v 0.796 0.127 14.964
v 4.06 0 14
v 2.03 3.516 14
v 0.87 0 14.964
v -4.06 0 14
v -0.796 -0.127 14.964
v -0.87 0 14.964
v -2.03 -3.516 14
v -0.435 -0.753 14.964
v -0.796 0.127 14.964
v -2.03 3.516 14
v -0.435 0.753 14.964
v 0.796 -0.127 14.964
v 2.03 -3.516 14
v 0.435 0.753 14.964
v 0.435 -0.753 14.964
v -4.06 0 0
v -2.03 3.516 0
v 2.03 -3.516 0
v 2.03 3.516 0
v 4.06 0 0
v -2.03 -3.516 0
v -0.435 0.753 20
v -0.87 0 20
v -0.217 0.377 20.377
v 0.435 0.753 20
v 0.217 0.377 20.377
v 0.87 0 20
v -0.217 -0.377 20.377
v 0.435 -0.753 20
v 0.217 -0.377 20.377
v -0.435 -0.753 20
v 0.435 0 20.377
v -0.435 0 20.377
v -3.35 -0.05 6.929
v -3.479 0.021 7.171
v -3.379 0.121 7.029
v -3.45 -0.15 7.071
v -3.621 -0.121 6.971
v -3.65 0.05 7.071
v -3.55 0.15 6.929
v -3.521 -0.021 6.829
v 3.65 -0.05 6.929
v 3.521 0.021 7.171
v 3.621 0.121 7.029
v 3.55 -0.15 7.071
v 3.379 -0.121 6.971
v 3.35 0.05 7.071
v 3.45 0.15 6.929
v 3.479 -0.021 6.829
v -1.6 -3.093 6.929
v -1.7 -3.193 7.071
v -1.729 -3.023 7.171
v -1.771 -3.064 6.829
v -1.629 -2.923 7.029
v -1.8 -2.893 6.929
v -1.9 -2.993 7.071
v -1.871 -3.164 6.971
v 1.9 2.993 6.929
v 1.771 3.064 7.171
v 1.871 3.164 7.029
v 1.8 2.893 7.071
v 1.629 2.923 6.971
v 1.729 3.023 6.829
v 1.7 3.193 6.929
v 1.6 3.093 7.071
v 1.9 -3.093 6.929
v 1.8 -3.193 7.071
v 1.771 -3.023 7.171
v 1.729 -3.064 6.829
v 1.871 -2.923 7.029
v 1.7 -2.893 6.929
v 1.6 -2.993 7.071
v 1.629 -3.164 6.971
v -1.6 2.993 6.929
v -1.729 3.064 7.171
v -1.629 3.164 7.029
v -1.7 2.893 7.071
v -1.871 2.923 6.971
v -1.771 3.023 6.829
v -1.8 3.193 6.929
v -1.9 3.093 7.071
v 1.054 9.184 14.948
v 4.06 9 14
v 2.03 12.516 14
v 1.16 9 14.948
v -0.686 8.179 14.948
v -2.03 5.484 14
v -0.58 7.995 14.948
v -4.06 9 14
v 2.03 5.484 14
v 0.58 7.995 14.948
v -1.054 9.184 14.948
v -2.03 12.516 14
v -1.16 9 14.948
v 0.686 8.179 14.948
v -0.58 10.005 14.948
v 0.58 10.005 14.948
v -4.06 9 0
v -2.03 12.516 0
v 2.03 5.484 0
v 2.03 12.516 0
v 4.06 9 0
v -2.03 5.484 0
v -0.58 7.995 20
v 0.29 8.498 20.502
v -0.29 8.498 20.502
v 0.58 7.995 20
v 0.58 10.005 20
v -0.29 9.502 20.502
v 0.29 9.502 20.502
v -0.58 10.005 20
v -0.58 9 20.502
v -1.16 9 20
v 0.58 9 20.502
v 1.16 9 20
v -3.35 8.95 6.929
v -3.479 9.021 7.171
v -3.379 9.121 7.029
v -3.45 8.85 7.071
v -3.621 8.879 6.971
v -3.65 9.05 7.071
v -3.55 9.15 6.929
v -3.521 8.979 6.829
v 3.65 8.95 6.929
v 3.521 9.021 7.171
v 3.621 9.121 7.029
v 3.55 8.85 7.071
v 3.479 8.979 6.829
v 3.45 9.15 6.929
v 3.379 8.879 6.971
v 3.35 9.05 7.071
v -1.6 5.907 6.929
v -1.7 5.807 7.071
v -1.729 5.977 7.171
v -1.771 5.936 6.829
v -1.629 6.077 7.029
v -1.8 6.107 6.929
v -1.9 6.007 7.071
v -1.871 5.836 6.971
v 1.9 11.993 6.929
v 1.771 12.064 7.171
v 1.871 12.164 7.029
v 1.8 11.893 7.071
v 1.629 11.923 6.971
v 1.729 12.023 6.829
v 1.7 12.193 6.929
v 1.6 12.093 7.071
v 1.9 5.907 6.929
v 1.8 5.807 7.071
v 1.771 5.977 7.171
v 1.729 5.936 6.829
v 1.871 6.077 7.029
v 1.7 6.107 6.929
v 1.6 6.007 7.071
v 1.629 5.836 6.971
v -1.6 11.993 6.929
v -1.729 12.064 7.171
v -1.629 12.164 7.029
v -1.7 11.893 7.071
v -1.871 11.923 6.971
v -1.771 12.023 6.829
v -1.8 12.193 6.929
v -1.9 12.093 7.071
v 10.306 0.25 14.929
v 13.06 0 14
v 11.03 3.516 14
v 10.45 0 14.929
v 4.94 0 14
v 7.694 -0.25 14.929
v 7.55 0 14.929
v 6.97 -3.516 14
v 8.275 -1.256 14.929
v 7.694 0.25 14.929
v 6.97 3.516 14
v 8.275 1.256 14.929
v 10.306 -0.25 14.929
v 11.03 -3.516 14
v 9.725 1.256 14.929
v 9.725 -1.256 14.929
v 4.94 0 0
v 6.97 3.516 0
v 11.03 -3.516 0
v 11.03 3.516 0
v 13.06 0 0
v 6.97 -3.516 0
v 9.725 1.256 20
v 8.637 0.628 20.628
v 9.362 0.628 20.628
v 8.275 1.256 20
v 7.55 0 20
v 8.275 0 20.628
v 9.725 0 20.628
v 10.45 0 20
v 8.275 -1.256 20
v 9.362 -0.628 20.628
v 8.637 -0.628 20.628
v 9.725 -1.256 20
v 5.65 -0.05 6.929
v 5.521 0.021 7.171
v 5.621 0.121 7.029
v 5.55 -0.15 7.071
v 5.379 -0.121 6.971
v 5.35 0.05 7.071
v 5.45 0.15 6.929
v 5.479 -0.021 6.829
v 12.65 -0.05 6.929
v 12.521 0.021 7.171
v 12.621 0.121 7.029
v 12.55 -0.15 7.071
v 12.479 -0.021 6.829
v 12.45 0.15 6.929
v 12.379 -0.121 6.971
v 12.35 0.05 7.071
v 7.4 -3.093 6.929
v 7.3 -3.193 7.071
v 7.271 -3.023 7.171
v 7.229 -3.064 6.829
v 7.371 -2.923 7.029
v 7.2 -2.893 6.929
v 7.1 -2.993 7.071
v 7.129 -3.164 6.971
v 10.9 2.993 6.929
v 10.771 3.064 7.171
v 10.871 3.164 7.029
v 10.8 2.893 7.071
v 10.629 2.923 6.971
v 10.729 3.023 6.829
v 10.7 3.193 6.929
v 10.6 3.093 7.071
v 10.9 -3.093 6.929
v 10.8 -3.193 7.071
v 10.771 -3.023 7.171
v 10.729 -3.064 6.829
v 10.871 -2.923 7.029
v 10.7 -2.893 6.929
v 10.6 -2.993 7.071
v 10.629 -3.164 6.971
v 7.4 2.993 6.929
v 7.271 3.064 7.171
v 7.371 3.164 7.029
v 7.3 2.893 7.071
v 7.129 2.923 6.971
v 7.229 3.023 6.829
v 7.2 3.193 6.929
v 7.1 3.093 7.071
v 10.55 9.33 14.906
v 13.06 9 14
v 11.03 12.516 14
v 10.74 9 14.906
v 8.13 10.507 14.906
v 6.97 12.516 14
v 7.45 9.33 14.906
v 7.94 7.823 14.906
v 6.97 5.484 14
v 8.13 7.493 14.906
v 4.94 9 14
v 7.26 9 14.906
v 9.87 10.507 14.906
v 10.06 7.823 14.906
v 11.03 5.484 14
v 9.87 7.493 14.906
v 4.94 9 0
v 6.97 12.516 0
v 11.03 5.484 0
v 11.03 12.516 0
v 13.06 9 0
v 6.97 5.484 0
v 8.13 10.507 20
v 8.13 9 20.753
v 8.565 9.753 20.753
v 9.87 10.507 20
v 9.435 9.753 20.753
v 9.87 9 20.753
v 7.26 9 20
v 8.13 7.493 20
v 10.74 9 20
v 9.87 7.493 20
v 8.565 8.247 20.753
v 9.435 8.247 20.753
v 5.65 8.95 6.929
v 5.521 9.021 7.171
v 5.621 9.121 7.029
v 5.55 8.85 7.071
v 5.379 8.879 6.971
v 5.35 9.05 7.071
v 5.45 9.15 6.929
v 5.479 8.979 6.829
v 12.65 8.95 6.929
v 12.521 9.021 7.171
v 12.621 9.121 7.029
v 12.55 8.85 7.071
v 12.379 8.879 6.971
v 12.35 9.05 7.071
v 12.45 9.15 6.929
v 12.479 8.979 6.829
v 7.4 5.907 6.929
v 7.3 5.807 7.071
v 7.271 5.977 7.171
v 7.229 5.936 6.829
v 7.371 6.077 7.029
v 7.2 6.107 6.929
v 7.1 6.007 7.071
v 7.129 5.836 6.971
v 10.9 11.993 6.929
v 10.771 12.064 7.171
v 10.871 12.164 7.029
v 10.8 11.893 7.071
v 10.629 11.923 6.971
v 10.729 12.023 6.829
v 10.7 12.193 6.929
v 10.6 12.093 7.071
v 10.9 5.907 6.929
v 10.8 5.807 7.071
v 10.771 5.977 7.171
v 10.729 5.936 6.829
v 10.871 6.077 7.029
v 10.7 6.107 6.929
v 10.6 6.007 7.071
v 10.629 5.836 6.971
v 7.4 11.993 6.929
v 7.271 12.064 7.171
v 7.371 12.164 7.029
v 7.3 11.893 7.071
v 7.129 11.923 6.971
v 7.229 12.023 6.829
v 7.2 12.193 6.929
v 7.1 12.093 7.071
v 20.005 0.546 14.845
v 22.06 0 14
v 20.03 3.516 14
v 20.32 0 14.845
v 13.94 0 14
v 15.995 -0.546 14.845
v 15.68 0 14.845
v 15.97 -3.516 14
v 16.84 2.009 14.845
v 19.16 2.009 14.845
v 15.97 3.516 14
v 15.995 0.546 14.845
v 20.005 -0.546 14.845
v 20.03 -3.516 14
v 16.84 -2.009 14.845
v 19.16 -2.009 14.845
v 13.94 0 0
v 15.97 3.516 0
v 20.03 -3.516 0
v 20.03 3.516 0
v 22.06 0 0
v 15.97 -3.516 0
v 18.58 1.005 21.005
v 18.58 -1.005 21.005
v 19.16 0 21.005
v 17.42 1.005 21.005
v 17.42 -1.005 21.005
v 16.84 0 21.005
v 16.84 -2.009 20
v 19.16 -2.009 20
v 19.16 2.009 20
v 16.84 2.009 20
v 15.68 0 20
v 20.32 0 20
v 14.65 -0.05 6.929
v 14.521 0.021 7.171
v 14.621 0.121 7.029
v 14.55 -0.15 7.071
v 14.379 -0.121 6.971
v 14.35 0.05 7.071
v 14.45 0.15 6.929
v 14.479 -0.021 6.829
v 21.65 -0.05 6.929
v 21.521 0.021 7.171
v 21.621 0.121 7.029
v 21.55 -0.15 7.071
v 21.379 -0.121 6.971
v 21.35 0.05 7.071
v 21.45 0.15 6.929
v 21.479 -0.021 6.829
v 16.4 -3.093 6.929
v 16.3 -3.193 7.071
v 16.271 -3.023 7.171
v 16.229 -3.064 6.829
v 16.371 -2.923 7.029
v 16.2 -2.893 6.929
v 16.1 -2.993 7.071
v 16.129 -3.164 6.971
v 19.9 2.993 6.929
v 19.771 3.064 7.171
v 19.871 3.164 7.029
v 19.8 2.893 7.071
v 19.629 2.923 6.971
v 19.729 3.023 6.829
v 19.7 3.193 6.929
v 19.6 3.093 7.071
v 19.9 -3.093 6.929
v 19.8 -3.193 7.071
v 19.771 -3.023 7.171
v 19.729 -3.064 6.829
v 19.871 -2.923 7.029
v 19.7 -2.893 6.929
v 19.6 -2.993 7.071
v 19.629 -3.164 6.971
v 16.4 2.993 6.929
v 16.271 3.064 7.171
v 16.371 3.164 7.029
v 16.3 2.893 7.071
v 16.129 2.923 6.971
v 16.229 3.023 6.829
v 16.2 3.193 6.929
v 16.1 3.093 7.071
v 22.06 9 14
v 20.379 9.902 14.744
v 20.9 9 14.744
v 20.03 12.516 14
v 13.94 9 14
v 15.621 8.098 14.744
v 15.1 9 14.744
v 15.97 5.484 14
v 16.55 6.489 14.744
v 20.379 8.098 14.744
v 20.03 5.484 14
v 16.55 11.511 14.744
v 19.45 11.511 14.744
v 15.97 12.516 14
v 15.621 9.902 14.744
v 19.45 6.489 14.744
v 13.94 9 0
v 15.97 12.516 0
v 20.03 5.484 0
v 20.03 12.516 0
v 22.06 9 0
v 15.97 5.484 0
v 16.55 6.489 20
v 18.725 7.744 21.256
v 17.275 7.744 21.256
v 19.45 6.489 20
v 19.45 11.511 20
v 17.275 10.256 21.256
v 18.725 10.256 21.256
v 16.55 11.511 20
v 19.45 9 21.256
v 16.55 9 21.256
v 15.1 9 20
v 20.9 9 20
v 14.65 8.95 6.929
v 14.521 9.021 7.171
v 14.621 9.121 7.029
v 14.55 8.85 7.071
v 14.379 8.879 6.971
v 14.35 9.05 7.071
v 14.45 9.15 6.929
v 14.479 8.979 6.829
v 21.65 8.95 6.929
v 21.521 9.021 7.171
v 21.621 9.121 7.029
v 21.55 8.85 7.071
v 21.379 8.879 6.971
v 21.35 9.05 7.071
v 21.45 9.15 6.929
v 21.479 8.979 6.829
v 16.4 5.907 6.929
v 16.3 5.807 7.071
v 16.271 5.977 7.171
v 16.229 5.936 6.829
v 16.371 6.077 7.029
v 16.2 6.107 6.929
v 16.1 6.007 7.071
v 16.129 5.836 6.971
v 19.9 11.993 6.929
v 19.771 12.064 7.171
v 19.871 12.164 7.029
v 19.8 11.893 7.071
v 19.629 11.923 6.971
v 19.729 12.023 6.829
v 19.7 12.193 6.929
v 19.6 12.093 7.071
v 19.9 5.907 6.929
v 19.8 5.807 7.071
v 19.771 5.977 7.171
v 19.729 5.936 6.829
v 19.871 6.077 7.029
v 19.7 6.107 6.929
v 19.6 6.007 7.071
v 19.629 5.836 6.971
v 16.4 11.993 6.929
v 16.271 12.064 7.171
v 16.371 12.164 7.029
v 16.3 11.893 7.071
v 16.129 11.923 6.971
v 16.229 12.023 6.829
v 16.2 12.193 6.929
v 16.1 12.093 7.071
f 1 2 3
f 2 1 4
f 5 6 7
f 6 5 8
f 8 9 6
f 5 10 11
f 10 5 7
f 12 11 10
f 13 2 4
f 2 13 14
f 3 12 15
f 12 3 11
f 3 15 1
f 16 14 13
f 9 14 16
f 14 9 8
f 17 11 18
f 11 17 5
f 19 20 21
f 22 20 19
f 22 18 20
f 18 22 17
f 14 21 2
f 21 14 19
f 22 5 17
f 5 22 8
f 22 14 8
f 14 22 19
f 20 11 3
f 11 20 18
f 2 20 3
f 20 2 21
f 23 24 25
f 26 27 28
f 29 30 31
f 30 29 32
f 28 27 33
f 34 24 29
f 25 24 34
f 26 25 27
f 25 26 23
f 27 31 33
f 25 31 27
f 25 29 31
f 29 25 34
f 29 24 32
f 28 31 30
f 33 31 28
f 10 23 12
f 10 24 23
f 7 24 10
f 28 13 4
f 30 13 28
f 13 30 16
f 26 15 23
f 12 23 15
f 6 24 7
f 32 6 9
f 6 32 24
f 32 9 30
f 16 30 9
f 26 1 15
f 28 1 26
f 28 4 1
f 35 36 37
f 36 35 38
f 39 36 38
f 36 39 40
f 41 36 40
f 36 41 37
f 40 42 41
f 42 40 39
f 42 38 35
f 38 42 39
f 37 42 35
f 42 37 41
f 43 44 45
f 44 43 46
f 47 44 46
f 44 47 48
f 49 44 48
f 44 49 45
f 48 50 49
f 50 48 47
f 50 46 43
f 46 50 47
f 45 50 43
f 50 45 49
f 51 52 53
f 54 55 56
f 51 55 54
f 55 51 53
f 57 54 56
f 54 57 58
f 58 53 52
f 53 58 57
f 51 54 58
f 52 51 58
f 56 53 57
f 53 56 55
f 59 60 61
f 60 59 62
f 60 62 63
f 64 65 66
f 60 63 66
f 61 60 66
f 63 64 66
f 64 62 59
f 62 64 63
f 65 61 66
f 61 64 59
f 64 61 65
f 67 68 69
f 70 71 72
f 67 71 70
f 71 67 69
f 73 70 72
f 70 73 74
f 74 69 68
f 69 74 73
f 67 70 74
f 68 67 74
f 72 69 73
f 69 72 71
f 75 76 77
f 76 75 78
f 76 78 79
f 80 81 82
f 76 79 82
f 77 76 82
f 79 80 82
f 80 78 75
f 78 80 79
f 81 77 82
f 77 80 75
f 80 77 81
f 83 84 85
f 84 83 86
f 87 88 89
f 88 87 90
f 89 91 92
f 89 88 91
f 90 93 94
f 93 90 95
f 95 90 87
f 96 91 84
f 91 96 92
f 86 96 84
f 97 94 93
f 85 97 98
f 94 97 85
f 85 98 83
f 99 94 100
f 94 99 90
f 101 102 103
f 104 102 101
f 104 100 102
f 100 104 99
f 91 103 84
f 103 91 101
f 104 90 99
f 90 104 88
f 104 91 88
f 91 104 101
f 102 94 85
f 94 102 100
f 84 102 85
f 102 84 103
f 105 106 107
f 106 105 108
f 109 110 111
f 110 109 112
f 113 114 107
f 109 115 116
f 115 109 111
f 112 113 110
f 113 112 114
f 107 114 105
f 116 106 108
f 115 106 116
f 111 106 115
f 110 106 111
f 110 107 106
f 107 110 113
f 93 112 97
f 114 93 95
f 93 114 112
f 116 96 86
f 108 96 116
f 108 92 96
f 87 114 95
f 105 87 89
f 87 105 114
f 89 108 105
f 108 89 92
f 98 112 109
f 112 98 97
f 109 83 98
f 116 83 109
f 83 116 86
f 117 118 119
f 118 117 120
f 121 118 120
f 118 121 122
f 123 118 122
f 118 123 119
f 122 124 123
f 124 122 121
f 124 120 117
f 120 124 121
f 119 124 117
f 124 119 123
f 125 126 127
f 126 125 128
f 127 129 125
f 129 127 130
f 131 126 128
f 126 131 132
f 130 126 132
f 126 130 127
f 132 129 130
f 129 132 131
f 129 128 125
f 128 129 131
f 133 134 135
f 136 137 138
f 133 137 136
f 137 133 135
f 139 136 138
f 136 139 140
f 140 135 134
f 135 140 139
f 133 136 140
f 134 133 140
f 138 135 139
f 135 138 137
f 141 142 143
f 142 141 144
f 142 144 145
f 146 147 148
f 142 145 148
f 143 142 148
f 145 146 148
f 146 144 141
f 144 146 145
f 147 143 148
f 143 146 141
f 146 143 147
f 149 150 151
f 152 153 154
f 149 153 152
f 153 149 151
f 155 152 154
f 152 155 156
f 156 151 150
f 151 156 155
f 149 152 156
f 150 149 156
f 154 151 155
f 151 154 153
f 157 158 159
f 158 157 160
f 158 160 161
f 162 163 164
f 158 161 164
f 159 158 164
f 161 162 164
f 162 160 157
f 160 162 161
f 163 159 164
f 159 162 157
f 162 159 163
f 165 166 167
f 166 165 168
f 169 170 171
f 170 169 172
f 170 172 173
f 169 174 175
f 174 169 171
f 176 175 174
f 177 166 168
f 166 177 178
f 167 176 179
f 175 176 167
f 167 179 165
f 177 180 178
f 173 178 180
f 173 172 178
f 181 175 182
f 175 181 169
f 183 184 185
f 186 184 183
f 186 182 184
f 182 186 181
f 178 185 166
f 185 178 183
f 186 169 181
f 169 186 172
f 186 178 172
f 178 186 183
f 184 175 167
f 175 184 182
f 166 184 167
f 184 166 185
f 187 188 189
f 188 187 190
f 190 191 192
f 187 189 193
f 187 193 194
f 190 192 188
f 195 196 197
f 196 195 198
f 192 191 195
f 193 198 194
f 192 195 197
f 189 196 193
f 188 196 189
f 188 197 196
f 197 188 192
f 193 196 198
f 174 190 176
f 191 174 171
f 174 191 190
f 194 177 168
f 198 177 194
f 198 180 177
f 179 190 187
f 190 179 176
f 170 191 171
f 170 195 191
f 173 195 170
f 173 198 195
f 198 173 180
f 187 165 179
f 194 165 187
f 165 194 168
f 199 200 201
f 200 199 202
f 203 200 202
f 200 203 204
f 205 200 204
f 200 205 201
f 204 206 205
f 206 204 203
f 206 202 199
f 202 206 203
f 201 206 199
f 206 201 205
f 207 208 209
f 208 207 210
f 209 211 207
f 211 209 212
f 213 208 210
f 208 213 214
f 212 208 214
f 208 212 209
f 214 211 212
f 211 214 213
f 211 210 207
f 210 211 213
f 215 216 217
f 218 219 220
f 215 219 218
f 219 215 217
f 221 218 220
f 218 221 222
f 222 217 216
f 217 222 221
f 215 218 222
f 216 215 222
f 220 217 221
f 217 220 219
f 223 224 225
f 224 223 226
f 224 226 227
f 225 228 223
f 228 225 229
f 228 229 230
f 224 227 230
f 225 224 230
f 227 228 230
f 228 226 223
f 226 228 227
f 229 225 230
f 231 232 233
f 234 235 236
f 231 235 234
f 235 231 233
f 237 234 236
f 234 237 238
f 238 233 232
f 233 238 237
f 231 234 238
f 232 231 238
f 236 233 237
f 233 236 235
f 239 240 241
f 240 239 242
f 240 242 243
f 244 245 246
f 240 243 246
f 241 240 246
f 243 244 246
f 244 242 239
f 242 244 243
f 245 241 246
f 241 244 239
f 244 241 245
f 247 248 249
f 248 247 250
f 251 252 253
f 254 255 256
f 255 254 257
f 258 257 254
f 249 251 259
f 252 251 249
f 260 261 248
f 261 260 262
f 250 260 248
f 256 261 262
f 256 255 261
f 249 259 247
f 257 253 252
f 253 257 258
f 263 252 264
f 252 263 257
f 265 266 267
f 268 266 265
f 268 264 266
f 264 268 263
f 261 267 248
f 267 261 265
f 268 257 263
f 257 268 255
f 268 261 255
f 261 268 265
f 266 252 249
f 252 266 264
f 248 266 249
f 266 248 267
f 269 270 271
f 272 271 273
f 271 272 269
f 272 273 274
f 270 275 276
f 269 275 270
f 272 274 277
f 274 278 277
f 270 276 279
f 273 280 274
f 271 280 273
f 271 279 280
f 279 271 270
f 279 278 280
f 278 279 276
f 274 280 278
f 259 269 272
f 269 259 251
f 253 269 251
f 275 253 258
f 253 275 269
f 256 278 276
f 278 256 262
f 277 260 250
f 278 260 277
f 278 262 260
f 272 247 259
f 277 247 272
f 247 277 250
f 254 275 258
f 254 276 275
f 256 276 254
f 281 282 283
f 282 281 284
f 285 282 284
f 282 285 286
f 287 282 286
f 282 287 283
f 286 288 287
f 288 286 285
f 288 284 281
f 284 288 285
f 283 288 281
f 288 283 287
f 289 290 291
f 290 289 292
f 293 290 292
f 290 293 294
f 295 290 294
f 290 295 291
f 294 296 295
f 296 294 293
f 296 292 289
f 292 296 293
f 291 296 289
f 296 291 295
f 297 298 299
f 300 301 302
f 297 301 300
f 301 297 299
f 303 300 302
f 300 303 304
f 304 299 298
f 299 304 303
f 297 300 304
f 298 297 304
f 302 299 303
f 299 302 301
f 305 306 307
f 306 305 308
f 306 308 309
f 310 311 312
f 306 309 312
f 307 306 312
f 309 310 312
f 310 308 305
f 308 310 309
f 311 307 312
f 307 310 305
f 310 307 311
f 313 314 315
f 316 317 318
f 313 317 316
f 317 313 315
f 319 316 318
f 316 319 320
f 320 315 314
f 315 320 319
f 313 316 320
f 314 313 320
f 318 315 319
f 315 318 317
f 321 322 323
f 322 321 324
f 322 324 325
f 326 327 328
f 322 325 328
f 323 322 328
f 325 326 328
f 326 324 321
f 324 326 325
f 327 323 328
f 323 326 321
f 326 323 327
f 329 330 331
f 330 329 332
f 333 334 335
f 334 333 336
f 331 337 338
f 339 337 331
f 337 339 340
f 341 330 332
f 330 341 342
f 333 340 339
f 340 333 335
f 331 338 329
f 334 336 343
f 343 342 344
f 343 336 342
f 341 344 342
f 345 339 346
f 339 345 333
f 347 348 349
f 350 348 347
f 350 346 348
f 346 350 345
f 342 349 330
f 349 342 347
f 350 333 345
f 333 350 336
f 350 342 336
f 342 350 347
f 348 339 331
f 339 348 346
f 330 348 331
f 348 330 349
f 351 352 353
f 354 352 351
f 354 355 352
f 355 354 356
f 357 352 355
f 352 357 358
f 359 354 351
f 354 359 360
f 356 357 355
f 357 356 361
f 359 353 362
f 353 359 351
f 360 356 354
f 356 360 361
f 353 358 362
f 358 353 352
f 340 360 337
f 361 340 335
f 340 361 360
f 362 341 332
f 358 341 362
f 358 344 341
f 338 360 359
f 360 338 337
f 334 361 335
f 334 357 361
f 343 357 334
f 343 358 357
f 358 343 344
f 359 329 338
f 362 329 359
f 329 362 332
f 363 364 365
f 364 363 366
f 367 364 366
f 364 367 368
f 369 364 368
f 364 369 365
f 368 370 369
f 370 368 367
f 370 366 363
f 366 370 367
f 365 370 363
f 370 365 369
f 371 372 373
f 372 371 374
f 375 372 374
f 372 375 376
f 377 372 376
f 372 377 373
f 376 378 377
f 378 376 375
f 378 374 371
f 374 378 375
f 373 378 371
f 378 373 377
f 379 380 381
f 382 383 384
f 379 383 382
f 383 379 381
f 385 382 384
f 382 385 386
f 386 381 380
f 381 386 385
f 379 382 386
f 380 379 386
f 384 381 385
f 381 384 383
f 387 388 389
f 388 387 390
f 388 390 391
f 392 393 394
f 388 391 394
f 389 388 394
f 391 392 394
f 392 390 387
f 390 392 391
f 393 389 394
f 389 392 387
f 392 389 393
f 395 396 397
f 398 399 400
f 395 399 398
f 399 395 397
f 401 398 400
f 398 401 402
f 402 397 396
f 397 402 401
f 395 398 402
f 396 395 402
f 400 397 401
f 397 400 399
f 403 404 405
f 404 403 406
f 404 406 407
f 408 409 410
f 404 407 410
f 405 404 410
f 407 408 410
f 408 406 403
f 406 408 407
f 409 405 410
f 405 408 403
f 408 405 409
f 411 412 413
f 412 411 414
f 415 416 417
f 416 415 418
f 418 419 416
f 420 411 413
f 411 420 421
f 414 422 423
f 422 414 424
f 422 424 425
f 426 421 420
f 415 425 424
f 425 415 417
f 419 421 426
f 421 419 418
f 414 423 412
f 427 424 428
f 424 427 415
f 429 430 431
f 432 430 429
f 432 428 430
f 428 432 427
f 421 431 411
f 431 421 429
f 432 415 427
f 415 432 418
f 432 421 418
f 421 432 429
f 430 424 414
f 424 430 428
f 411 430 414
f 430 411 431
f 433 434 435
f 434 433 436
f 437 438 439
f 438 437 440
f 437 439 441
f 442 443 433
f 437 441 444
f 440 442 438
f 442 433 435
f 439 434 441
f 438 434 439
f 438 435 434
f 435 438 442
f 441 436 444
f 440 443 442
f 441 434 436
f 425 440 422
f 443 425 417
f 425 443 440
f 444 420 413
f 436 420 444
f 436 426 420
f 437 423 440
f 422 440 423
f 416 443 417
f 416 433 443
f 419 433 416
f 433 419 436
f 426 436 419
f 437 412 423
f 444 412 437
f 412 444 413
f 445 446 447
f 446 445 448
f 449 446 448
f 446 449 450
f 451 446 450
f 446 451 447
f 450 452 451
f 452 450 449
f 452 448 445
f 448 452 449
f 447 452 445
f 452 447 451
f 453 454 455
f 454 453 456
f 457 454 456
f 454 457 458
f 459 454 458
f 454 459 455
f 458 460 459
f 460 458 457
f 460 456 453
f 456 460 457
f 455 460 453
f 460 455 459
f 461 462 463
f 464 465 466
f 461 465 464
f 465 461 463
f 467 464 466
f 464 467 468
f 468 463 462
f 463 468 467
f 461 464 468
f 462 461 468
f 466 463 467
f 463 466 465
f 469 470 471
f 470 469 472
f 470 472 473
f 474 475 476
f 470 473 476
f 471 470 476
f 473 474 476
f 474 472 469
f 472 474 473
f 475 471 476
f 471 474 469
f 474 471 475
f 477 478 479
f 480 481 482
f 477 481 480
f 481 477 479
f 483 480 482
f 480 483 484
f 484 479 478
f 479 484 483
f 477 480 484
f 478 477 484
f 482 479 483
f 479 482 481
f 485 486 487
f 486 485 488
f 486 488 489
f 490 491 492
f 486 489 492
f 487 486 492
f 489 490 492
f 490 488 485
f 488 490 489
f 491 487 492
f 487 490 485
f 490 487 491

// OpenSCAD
// Hex bits

bit_type = "Hex"; // [Hex, Double Hex, Hex Socket, Square, Square Socket, Double Square, Star]
magnet_slot = "false"; // [true, false]
magnet_diameter = 6;
magnet_height = 3;
sizes = [1.5,2,2.5,3,4,5];
number = len(sizes);
bit_size = 7;
tip_length = 6;
bit_length = 14;
bit_spacing = 2;
xc = number;
yc = round(sqrt(number));
count = number;

if(bit_type == "Hex"){
    build_hex();
}

else if(bit_type == "Hex Socket"){
    build_hex_socket();
}

else if(bit_type == "Double Hex"){
    build_dbl_hex();
}


else if(bit_type == "Square"){
    build_square();
}


else if(bit_type == "Square Socket"){
    build_square_socket();
}


else if(bit_type == "Double Square"){
    build_dbl_square();
}

if(bit_type == "Star"){
    build_star();
}

module build_hex(){
     
    for (x = [0:xc-1]){
    for(y = [0:yc-1]){
    county = count-y;
    if(county > 0){
    difference(){
        union(){
    
    base(x,y);
    sizes = sizes*1.16;
    translate([x*(bit_size+bit_spacing), y*(bit_size+bit_spacing), tip_length+bit_length]) scale([1,1,.5]) sphere($fn=6,d=sizes[y+(yc*x)]);
    
    translate([x*(bit_size+bit_spacing),y*(bit_size+bit_spacing),bit_length]) linear_extrude (height = tip_length, center = false, convexity = 10) polygon(ngon(6, sizes[y+(yc*x)]/2));
    
    }
    notch_cut(x, y);
    }
}
}
count = count-x*yc;
}
}

module build_hex_socket(){
    for (x = [0:xc-1]){
    for(y = [0:yc-1]){
    county = count-y;
    if(county > 0){
        sizes = sizes*1.16;
    difference(){
    union(){
    base(x,y);
    translate([x*(bit_size+bit_spacing),y*(bit_size+bit_spacing),bit_length+1]) linear_extrude (height = tip_length, center = false, convexity = 10) polygon(ngon(30, sizes[y+(yc*x)]/2+1));
    
        translate([x*(bit_size+bit_spacing), y*(bit_size+bit_spacing), bit_length+2]) scale([1,1,.5]) sphere($fn=6,d=sizes[y+(yc*x)]);
    }
    
    translate([x*(bit_size+bit_spacing), y*(bit_size+bit_spacing), bit_length+2]) scale([1,1,.5]) sphere($fn=6,d=sizes[y+(yc*x)]);
    
    translate([x*(bit_size+bit_spacing),y*(bit_size+bit_spacing),bit_length+2]) linear_extrude (height = tip_length, center = false, convexity = 10) polygon(ngon(6, sizes[y+(yc*x)]/2));
    notch_cut(x, y);
    }
    echo(county, "add");
}
echo(count);
}
count = count-x*yc;
}
}

module build_dbl_hex(){
    
    for (x = [0:xc-1]){
    for(y = [0:yc-1]){
    county = count-y;
    if(county > 0){
    difference(){
        union(){
    base(x,y);
   sizes = sizes*1.16;
    translate([x*(bit_size+bit_spacing),y*(bit_size+bit_spacing),bit_length]) linear_extrude (height = tip_length, center = false, convexity = 10) polygon(ngon(6, sizes[y+(yc*x)]/2));
        translate([x*(bit_size+bit_spacing),y*(bit_size+bit_spacing),bit_length]) rotate(90) linear_extrude (height = tip_length, center = false, convexity = 10) polygon(ngon(6, sizes[y+(yc*x)]/2));
    }
    notch_cut(x,y);
}
    echo(county, "add");
}
echo(count);
}
count = count-x*yc;
}
}

module build_square(){
for (x = [0:xc-1]){
    for(y = [0:yc-1]){
    county = count-y;
    if(county > 0){
    difference(){
        union(){
        base(x,y);
       sizes = sizes*1.1;
        translate([x*(bit_size+bit_spacing),y*(bit_size+bit_spacing),bit_length]) linear_extrude (height = tip_length, center = false, convexity = 10) rotate(45) polygon(ngon(4, sizes[y+(yc*x)]/2));  
    }
    notch_cut(x,y);
    }
    echo(county, "add");
}
echo(count);
}
count = count-x*yc;
}

}

module build_square_socket(){
    for (x = [0:xc-1]){
    for(y = [0:yc-1]){
    county = count-y;
    if(county > 0){
    difference(){
    union(){
    base(x,y);
        sizes = sizes*1.1;
    translate([x*(bit_size+bit_spacing),y*(bit_size+bit_spacing),bit_length+1]) linear_extrude (height = tip_length, center = false, convexity = 10) polygon(ngon(30, sizes[y+(yc*x)]/2+1));
    
        translate([x*(bit_size+bit_spacing), y*(bit_size+bit_spacing), bit_length+2]) scale([1,1,.5]) sphere($fn=6,d=sizes[y+(yc*x)]);
    }
    
    translate([x*(bit_size+bit_spacing),y*(bit_size+bit_spacing),bit_length+2]) linear_extrude (height = tip_length, center = false, convexity = 10) rotate(45) polygon(ngon(4, sizes[y+(yc*x)]/2));
    
    notch_cut(x, y);
    }
    echo(county, "add");
}
echo(count);
}
count = count-x*yc;
}
}

module build_dbl_square(){
for (x = [0:xc-1]){
    for(y = [0:yc-1]){
    county = count-y;
    if(county > 0){
    difference(){
        union(){
        base(x,y);
        sizes = sizes*1.1;
        translate([x*(bit_size+bit_spacing),y*(bit_size+bit_spacing),bit_length]) linear_extrude (height = tip_length, center = false, convexity = 10) rotate(45) polygon(ngon(4, sizes[y+(yc*x)]/2)); 
        translate([x*(bit_size+bit_spacing),y*(bit_size+bit_spacing),bit_length]) linear_extrude (height = tip_length, center = false, convexity = 10) polygon(ngon(4, sizes[y+(yc*x)]/2)); 
    
    }
    notch_cut(x,y);
    }
    echo(county, "add");
}
echo(count);
}
count = count-x*yc;
}

}

module base(x,y){
   
       difference(){
        union(){
    if(bit_type == "Hex Socket" || bit_type == "Square Socket"){
        translate([x*(bit_size+bit_spacing),y*(bit_size+bit_spacing),bit_length]) cylinder($fn=6, height = 1, r1 = bit_size*1.16/2, r2 = sizes[y+(yc*x)]/2+1);
    }
    else{
     translate([x*(bit_size+bit_spacing),y*(bit_size+bit_spacing),bit_length]) cylinder($fn=6, height = 1, r1 = bit_size*1.16/2, r2 = sizes[y+(yc*x)]/2);
    }
    linear_extrude(height = bit_length,     center = false) translate([x*(bit_size+bit_spacing),y*(bit_size+bit_spacing),0]) polygon(ngon(6, bit_size*1.16/2));
}
 if(magnet_slot == "true"){
            translate([x*(bit_size+bit_spacing),y*(bit_size+bit_spacing),1]) cylinder($fn=30, height = magnet_height+.4, r1 = magnet_diameter/2+.2, r2 = magnet_diameter/2+.2);
        }

}
}
module build_star(){
    
    for (x = [0:xc-1]){
    for(y = [0:yc-1]){
    county = count-y;
    if(county > 0){
    difference(){
        union(){
    base(x,y);
   sizes = sizes*1.16;
    translate([x*(bit_size+bit_spacing),y*(bit_size+bit_spacing),bit_length]) linear_extrude (height = tip_length, center = false, convexity = 10) polygon(ngon(3, sizes[y+(yc*x)]/2));
        translate([x*(bit_size+bit_spacing),y*(bit_size+bit_spacing),bit_length]) rotate(180) linear_extrude (height = tip_length, center = false, convexity = 10) polygon(ngon(3, sizes[y+(yc*x)]/2));
    }
    notch_cut(x,y);
}
    echo(county, "add");
}
echo(count);
}
count = count-x*yc;
}
}

module notch_cut(x, y){
    // Notch Cut
        translate([x*(bit_size+bit_spacing)-bit_size/2,y*(bit_size+bit_spacing),bit_length/2]) rotate([45, 45, 45])cube(size = .2, center = true);
    translate([x*(bit_size+bit_spacing)+bit_size/2,y*(bit_size+bit_spacing),bit_length/2]) rotate([45, 45, 45])cube(size = .2, center = true);
        translate([x*(bit_size+bit_spacing)-bit_size/4,y*(bit_size+bit_spacing)-bit_size/2.3,bit_length/2]) rotate([45, 45, 45])cube(size = .2, center = true);
    translate([x*(bit_size+bit_spacing)+bit_size/4,y*(bit_size+bit_spacing)+bit_size/2.3,bit_length/2]) rotate([45, 45, 45])cube(size = .2, center = true);
    translate([x*(bit_size+bit_spacing)+bit_size/4,y*(bit_size+bit_spacing)-bit_size/2.3,bit_length/2]) rotate([45, 45, 45])cube(size = .2, center = true);
    translate([x*(bit_size+bit_spacing)-bit_size/4,y*(bit_size+bit_spacing)+bit_size/2.3,bit_length/2]) rotate([45, 45, 45])cube(size = .2, center = true);
}
function ngon(num, r) = 
    [for (i=[0:num-1], a=i*360/num) [ r*cos(a), r*sin(a)]];
